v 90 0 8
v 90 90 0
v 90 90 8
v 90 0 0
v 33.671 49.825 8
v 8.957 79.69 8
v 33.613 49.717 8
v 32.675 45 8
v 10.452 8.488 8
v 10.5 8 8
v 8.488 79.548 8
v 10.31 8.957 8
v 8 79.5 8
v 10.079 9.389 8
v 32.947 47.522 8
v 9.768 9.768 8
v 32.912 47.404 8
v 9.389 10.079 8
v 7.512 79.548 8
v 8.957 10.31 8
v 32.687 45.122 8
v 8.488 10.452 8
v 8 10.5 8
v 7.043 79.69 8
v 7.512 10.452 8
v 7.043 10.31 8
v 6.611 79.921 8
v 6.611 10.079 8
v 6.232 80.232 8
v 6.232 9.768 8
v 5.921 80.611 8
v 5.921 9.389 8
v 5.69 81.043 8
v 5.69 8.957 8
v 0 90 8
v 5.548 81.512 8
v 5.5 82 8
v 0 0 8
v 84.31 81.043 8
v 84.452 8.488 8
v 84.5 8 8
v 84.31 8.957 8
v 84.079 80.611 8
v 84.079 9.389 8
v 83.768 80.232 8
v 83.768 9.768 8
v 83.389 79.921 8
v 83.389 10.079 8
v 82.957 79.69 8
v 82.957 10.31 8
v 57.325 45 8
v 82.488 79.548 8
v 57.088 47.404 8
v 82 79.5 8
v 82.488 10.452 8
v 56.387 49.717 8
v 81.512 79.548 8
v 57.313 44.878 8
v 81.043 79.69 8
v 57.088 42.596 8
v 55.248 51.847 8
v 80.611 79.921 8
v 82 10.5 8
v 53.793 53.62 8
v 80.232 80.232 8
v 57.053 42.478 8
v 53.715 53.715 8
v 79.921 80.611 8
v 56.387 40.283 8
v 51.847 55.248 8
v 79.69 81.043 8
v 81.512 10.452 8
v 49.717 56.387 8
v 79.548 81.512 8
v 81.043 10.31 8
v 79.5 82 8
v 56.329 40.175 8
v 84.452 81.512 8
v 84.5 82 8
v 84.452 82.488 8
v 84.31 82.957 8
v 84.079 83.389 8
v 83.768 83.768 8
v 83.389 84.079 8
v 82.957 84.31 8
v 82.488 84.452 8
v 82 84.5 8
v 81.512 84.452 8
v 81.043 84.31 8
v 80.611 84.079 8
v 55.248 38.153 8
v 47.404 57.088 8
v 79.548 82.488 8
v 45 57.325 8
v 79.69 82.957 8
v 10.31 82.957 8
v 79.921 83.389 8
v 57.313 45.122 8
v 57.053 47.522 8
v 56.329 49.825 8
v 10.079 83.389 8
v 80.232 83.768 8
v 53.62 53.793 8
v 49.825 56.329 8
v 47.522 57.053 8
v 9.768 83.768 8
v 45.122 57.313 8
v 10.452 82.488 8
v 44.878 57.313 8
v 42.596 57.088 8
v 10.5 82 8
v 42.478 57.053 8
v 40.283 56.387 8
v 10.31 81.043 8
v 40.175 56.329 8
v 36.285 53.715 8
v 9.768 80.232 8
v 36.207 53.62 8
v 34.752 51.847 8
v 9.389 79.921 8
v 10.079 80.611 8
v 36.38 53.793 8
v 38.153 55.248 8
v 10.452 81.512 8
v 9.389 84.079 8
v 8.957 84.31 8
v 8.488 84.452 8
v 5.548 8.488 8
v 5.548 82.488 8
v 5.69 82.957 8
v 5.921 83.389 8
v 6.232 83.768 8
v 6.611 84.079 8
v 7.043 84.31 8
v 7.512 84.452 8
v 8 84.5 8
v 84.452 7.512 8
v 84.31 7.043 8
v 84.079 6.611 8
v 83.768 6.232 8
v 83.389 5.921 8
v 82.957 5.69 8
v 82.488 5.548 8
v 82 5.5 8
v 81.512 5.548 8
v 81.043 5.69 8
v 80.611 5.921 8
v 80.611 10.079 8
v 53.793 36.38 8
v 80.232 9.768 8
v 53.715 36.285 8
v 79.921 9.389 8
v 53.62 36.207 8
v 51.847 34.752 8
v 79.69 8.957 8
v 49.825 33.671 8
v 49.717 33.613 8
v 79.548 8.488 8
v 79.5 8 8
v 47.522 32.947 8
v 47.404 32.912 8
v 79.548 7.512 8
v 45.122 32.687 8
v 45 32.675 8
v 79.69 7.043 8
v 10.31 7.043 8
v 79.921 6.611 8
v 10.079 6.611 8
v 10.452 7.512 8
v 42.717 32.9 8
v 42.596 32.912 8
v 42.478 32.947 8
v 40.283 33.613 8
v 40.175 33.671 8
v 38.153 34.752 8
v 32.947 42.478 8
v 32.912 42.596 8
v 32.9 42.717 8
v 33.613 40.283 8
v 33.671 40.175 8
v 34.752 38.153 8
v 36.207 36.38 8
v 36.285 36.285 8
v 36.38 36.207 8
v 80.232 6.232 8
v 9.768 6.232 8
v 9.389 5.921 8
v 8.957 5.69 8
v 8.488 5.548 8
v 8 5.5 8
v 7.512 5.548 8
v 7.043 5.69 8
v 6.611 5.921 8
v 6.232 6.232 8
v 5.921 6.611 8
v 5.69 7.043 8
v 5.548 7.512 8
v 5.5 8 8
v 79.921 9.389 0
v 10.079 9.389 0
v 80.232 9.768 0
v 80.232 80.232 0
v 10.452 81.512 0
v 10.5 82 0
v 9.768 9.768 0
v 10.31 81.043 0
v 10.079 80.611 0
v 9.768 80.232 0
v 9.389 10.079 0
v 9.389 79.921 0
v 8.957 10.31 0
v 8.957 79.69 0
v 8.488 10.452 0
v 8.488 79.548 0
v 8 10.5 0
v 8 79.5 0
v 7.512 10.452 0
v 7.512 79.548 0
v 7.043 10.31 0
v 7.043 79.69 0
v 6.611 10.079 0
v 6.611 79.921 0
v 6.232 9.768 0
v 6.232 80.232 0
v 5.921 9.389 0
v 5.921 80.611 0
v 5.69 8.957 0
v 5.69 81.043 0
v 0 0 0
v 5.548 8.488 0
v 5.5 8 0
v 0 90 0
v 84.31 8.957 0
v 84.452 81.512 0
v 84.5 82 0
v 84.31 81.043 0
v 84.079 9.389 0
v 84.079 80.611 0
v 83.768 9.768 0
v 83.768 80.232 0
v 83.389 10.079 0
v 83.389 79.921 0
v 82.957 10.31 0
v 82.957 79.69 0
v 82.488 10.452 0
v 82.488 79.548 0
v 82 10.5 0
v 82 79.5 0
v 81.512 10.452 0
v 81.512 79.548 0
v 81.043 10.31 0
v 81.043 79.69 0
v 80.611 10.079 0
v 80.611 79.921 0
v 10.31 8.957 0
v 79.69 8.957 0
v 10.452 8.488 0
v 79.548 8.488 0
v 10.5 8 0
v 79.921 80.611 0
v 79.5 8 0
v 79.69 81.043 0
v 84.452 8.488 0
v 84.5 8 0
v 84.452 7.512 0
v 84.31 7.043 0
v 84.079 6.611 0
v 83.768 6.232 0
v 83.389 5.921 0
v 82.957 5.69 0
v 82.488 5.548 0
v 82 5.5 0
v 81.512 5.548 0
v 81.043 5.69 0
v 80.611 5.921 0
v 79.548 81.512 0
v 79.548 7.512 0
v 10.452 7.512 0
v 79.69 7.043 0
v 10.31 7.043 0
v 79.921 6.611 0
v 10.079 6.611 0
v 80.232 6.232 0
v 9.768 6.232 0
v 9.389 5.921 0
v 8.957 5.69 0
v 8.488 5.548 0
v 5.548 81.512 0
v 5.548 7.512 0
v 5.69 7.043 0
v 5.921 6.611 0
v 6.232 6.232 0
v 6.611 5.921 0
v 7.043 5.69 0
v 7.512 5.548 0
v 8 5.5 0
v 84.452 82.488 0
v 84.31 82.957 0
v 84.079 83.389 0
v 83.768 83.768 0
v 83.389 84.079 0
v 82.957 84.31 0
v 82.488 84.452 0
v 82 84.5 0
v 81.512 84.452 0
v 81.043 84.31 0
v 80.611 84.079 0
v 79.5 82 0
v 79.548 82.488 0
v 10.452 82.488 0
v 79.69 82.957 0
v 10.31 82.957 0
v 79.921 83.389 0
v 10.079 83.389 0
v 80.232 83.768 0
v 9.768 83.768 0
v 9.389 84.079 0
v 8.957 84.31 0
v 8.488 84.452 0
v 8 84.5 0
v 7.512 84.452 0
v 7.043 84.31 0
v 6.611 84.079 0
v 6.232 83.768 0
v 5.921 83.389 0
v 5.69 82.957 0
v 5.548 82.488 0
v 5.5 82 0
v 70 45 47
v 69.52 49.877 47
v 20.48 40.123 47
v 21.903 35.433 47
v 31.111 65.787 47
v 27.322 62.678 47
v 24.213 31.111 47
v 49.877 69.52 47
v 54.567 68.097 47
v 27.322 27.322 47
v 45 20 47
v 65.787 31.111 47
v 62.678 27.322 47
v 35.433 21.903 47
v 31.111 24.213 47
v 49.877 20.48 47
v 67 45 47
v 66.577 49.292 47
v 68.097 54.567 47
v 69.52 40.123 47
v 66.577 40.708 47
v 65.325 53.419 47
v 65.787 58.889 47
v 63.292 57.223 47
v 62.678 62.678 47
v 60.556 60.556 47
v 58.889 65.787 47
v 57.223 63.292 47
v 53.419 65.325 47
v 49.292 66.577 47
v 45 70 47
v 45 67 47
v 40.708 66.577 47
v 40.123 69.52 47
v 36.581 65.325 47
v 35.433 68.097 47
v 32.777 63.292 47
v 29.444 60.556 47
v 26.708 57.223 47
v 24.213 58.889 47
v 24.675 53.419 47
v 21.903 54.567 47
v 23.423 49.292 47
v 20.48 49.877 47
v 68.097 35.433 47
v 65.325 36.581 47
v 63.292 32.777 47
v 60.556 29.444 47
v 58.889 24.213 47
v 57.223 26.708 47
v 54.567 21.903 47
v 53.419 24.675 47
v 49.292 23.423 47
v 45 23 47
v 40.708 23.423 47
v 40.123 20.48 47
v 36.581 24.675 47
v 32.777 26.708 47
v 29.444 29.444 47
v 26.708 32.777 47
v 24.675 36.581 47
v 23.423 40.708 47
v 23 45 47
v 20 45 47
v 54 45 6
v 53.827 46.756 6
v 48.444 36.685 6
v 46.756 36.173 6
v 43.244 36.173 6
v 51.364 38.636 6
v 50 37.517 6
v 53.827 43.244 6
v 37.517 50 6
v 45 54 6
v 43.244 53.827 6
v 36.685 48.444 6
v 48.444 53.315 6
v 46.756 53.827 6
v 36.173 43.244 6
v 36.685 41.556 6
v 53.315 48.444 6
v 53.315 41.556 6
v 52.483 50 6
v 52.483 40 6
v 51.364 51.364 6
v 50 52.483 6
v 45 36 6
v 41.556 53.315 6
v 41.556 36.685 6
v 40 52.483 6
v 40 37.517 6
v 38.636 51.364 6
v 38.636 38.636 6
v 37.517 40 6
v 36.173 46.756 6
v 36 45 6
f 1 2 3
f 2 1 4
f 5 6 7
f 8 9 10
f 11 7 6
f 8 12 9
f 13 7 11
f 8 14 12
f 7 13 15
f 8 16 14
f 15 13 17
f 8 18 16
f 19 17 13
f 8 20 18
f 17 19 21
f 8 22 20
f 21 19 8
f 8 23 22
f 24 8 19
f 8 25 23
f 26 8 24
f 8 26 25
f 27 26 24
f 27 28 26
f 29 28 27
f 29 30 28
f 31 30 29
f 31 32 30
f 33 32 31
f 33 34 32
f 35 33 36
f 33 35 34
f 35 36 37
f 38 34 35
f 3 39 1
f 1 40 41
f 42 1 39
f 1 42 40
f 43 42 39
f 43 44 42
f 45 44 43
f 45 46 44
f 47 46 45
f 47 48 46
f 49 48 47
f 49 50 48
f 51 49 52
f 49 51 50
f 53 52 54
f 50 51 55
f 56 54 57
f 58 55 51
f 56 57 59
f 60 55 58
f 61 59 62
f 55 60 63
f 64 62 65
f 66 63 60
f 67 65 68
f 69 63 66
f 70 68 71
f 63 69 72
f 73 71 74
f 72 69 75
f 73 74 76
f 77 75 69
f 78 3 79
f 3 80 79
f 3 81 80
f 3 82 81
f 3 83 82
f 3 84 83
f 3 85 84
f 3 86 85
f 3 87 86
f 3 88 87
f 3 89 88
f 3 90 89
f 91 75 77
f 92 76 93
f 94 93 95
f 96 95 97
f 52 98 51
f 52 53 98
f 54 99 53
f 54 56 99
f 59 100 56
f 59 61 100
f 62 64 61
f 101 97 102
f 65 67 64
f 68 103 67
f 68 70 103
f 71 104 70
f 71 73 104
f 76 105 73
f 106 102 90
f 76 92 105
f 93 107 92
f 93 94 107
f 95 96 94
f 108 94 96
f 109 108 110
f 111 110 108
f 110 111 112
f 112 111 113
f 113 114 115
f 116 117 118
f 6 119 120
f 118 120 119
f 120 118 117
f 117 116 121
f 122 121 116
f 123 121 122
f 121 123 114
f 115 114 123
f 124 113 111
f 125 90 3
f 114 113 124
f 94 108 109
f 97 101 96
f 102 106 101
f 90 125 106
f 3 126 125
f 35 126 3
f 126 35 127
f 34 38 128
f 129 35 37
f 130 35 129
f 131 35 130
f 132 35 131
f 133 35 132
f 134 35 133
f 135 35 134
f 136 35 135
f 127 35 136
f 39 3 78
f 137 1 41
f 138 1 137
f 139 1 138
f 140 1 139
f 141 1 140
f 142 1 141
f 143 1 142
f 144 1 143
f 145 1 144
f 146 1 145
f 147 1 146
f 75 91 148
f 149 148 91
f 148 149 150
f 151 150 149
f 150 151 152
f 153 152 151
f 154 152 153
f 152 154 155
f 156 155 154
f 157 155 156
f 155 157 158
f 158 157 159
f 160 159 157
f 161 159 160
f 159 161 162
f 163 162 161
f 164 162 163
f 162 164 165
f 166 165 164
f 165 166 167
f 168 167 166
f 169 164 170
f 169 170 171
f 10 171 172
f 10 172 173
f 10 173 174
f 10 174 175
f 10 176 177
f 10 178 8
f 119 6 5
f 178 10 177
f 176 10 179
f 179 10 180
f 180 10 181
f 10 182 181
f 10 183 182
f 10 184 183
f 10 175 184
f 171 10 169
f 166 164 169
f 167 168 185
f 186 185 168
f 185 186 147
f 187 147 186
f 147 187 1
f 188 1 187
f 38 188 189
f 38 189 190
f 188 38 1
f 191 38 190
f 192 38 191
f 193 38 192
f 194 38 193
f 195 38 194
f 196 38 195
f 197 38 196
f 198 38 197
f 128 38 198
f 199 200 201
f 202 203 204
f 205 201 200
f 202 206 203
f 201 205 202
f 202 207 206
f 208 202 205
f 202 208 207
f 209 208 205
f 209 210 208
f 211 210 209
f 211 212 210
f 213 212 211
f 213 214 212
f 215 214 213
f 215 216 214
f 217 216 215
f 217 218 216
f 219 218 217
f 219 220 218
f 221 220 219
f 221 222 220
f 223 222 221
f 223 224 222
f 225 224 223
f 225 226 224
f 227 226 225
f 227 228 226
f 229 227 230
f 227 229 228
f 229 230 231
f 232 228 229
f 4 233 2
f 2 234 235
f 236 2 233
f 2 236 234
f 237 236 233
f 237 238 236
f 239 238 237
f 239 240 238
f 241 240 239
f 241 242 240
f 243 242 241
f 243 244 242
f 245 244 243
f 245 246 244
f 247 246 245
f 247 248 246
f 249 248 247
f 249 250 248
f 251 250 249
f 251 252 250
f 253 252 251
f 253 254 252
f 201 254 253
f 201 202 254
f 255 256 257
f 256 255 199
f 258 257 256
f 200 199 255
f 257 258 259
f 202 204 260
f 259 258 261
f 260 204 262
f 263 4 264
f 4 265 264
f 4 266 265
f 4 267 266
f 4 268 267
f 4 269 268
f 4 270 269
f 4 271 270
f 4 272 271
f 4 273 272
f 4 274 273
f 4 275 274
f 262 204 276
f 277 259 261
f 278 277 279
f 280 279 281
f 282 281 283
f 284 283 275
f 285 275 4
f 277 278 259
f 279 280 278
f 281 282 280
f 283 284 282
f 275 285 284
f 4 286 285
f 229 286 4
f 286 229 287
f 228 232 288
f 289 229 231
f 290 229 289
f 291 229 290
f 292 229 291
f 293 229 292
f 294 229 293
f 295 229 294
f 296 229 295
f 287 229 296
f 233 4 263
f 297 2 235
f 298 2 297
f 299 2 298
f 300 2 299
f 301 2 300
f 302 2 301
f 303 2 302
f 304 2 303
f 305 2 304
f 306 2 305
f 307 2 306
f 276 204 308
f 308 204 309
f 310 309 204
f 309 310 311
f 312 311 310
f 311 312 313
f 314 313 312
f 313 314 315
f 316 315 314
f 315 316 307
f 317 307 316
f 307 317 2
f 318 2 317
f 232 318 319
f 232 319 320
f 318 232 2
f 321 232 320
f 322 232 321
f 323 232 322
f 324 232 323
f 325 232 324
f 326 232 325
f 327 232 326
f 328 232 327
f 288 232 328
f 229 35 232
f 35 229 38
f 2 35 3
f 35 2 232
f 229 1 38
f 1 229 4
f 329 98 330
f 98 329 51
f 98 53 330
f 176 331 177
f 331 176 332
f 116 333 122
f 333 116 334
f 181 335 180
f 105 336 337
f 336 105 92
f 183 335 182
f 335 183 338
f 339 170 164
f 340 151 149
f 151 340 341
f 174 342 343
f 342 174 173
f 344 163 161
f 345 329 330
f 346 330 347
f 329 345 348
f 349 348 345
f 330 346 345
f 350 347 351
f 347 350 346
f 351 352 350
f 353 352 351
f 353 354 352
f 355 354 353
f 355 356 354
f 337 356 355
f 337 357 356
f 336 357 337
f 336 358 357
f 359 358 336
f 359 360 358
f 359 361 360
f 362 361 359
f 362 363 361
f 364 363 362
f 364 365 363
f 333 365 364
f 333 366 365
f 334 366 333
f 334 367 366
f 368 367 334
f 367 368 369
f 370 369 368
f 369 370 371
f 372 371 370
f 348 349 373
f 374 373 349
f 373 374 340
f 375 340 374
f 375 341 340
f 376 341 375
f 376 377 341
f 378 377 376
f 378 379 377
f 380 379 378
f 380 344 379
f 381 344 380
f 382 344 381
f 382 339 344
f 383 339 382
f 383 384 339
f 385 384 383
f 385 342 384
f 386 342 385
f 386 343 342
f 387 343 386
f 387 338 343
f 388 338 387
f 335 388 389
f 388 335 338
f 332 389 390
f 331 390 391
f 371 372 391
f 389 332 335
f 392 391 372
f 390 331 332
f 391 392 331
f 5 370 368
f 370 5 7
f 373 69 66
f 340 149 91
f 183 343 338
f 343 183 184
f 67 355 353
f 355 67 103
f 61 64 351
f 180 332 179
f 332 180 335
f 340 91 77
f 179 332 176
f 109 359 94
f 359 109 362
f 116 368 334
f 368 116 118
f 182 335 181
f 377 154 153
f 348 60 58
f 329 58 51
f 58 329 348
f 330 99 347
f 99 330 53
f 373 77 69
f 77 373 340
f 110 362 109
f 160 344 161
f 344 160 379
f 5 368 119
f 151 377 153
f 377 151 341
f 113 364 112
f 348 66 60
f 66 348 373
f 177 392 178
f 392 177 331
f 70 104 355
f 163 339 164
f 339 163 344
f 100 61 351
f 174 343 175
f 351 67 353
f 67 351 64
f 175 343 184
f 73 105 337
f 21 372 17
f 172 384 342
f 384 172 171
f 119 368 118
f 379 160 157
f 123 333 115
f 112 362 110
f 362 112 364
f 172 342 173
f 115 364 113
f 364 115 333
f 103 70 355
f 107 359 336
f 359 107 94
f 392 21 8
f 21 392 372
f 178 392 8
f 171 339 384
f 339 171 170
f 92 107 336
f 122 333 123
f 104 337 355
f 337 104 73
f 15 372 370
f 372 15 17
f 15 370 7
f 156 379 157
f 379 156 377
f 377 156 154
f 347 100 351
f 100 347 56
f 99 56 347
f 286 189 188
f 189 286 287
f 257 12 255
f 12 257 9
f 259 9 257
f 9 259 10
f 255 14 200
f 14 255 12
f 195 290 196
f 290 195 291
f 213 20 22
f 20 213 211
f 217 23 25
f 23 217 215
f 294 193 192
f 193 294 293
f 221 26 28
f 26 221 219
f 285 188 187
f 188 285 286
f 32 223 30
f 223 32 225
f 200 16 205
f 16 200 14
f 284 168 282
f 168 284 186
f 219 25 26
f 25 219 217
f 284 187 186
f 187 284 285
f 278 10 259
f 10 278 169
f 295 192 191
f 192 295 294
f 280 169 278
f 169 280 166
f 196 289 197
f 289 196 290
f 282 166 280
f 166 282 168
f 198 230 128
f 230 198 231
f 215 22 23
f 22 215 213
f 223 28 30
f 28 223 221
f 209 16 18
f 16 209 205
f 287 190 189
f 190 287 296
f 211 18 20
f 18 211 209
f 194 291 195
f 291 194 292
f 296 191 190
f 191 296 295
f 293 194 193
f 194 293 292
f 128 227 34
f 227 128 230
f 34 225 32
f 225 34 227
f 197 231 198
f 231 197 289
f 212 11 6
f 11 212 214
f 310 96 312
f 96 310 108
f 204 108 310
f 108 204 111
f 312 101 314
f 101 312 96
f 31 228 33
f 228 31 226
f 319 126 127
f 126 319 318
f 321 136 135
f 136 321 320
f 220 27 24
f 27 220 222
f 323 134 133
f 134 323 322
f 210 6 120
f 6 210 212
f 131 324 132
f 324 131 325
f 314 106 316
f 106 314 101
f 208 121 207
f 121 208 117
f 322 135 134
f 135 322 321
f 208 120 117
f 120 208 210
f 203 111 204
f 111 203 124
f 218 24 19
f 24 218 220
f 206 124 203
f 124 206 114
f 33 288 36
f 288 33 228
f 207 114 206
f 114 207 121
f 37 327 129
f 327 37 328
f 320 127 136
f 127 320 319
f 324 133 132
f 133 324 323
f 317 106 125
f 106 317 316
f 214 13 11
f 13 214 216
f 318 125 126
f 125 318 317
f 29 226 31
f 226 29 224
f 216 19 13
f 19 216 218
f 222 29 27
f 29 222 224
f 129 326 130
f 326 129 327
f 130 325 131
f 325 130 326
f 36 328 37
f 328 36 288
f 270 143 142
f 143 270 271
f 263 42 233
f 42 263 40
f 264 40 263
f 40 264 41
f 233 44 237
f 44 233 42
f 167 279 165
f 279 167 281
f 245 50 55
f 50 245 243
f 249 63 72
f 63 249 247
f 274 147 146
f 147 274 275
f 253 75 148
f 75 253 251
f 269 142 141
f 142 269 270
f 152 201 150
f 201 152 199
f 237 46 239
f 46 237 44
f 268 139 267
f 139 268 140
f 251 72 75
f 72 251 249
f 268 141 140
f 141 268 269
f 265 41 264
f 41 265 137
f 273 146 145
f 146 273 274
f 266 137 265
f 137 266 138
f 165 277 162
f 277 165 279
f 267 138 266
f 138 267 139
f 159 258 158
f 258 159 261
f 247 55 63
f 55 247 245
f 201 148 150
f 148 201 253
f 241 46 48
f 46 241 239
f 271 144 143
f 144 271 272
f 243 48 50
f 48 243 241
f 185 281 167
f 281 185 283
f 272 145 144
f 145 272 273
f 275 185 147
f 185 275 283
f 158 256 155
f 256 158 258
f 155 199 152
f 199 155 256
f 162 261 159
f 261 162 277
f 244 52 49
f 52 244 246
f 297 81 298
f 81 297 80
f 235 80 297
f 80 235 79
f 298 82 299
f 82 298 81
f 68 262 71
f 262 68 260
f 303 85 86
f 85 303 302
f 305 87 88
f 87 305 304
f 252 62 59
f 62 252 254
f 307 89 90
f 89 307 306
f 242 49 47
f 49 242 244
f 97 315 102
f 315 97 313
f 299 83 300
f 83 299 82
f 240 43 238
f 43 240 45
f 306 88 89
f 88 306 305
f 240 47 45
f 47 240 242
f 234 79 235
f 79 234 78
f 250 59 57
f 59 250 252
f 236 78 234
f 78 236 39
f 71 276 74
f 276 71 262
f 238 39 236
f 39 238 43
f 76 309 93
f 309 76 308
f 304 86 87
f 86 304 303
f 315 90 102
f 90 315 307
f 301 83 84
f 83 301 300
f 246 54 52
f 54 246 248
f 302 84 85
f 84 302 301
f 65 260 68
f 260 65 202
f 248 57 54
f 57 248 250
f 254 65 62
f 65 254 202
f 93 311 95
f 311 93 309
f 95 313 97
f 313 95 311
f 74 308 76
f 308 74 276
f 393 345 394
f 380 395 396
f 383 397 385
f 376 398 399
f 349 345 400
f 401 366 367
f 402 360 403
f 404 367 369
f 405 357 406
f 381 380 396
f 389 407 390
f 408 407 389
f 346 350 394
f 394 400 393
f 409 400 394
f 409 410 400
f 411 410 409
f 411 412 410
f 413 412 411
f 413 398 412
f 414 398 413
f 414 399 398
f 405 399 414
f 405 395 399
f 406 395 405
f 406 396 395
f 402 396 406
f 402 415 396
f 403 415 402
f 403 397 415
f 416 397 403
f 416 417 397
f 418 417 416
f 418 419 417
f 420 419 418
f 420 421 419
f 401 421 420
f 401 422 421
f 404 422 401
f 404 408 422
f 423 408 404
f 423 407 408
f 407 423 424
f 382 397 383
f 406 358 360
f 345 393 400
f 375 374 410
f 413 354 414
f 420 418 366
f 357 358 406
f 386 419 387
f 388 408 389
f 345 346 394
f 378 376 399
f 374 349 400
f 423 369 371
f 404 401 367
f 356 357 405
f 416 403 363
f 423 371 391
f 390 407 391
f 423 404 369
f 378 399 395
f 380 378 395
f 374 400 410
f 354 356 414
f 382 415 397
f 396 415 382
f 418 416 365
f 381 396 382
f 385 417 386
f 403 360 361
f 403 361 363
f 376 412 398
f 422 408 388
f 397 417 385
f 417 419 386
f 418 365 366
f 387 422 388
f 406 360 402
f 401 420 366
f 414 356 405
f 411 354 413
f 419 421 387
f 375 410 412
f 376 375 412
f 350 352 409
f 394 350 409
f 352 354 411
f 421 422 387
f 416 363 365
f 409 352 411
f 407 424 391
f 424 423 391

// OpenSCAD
$fn = 32;

// ----------------------------------------------------------------------
// Hopper: flanged with square flange
// ----------------------------------------------------------------------

// --- parameters (mm) ---
fl = 90;                  // flange side, X and Y
fl_t = 8;                 // flange thickness
cone_h = 40;              // cone height above the flange
top_d = 50;               // cone mouth diameter
bot_d = 24;               // cone spout diameter
wall = 3;                 // cone wall thickness
hole_r = 2.5;             // flange hole radius
hole_in = 8;              // hole inset from the corners

bore_d = bot_d - 2 * wall;  // spout bore diameter
total_h = fl_t + cone_h - 1;  // overall height

difference() {
  union() {
    cube([fl, fl, fl_t]);
    translate([fl / 2, fl / 2, fl_t - 1])
      cylinder(h = cone_h, d1 = bot_d, d2 = top_d);
  }
  translate([fl / 2, fl / 2, fl_t - 2])
    cylinder(h = cone_h + 1, d1 = bore_d, d2 = top_d - 2 * wall);
  for (sx = [0, 1], sy = [0, 1])
    translate([sx ? fl - hole_in : hole_in,
               sy ? fl - hole_in : hole_in, -1])
      cylinder(r = hole_r, h = fl_t + 2);
}
